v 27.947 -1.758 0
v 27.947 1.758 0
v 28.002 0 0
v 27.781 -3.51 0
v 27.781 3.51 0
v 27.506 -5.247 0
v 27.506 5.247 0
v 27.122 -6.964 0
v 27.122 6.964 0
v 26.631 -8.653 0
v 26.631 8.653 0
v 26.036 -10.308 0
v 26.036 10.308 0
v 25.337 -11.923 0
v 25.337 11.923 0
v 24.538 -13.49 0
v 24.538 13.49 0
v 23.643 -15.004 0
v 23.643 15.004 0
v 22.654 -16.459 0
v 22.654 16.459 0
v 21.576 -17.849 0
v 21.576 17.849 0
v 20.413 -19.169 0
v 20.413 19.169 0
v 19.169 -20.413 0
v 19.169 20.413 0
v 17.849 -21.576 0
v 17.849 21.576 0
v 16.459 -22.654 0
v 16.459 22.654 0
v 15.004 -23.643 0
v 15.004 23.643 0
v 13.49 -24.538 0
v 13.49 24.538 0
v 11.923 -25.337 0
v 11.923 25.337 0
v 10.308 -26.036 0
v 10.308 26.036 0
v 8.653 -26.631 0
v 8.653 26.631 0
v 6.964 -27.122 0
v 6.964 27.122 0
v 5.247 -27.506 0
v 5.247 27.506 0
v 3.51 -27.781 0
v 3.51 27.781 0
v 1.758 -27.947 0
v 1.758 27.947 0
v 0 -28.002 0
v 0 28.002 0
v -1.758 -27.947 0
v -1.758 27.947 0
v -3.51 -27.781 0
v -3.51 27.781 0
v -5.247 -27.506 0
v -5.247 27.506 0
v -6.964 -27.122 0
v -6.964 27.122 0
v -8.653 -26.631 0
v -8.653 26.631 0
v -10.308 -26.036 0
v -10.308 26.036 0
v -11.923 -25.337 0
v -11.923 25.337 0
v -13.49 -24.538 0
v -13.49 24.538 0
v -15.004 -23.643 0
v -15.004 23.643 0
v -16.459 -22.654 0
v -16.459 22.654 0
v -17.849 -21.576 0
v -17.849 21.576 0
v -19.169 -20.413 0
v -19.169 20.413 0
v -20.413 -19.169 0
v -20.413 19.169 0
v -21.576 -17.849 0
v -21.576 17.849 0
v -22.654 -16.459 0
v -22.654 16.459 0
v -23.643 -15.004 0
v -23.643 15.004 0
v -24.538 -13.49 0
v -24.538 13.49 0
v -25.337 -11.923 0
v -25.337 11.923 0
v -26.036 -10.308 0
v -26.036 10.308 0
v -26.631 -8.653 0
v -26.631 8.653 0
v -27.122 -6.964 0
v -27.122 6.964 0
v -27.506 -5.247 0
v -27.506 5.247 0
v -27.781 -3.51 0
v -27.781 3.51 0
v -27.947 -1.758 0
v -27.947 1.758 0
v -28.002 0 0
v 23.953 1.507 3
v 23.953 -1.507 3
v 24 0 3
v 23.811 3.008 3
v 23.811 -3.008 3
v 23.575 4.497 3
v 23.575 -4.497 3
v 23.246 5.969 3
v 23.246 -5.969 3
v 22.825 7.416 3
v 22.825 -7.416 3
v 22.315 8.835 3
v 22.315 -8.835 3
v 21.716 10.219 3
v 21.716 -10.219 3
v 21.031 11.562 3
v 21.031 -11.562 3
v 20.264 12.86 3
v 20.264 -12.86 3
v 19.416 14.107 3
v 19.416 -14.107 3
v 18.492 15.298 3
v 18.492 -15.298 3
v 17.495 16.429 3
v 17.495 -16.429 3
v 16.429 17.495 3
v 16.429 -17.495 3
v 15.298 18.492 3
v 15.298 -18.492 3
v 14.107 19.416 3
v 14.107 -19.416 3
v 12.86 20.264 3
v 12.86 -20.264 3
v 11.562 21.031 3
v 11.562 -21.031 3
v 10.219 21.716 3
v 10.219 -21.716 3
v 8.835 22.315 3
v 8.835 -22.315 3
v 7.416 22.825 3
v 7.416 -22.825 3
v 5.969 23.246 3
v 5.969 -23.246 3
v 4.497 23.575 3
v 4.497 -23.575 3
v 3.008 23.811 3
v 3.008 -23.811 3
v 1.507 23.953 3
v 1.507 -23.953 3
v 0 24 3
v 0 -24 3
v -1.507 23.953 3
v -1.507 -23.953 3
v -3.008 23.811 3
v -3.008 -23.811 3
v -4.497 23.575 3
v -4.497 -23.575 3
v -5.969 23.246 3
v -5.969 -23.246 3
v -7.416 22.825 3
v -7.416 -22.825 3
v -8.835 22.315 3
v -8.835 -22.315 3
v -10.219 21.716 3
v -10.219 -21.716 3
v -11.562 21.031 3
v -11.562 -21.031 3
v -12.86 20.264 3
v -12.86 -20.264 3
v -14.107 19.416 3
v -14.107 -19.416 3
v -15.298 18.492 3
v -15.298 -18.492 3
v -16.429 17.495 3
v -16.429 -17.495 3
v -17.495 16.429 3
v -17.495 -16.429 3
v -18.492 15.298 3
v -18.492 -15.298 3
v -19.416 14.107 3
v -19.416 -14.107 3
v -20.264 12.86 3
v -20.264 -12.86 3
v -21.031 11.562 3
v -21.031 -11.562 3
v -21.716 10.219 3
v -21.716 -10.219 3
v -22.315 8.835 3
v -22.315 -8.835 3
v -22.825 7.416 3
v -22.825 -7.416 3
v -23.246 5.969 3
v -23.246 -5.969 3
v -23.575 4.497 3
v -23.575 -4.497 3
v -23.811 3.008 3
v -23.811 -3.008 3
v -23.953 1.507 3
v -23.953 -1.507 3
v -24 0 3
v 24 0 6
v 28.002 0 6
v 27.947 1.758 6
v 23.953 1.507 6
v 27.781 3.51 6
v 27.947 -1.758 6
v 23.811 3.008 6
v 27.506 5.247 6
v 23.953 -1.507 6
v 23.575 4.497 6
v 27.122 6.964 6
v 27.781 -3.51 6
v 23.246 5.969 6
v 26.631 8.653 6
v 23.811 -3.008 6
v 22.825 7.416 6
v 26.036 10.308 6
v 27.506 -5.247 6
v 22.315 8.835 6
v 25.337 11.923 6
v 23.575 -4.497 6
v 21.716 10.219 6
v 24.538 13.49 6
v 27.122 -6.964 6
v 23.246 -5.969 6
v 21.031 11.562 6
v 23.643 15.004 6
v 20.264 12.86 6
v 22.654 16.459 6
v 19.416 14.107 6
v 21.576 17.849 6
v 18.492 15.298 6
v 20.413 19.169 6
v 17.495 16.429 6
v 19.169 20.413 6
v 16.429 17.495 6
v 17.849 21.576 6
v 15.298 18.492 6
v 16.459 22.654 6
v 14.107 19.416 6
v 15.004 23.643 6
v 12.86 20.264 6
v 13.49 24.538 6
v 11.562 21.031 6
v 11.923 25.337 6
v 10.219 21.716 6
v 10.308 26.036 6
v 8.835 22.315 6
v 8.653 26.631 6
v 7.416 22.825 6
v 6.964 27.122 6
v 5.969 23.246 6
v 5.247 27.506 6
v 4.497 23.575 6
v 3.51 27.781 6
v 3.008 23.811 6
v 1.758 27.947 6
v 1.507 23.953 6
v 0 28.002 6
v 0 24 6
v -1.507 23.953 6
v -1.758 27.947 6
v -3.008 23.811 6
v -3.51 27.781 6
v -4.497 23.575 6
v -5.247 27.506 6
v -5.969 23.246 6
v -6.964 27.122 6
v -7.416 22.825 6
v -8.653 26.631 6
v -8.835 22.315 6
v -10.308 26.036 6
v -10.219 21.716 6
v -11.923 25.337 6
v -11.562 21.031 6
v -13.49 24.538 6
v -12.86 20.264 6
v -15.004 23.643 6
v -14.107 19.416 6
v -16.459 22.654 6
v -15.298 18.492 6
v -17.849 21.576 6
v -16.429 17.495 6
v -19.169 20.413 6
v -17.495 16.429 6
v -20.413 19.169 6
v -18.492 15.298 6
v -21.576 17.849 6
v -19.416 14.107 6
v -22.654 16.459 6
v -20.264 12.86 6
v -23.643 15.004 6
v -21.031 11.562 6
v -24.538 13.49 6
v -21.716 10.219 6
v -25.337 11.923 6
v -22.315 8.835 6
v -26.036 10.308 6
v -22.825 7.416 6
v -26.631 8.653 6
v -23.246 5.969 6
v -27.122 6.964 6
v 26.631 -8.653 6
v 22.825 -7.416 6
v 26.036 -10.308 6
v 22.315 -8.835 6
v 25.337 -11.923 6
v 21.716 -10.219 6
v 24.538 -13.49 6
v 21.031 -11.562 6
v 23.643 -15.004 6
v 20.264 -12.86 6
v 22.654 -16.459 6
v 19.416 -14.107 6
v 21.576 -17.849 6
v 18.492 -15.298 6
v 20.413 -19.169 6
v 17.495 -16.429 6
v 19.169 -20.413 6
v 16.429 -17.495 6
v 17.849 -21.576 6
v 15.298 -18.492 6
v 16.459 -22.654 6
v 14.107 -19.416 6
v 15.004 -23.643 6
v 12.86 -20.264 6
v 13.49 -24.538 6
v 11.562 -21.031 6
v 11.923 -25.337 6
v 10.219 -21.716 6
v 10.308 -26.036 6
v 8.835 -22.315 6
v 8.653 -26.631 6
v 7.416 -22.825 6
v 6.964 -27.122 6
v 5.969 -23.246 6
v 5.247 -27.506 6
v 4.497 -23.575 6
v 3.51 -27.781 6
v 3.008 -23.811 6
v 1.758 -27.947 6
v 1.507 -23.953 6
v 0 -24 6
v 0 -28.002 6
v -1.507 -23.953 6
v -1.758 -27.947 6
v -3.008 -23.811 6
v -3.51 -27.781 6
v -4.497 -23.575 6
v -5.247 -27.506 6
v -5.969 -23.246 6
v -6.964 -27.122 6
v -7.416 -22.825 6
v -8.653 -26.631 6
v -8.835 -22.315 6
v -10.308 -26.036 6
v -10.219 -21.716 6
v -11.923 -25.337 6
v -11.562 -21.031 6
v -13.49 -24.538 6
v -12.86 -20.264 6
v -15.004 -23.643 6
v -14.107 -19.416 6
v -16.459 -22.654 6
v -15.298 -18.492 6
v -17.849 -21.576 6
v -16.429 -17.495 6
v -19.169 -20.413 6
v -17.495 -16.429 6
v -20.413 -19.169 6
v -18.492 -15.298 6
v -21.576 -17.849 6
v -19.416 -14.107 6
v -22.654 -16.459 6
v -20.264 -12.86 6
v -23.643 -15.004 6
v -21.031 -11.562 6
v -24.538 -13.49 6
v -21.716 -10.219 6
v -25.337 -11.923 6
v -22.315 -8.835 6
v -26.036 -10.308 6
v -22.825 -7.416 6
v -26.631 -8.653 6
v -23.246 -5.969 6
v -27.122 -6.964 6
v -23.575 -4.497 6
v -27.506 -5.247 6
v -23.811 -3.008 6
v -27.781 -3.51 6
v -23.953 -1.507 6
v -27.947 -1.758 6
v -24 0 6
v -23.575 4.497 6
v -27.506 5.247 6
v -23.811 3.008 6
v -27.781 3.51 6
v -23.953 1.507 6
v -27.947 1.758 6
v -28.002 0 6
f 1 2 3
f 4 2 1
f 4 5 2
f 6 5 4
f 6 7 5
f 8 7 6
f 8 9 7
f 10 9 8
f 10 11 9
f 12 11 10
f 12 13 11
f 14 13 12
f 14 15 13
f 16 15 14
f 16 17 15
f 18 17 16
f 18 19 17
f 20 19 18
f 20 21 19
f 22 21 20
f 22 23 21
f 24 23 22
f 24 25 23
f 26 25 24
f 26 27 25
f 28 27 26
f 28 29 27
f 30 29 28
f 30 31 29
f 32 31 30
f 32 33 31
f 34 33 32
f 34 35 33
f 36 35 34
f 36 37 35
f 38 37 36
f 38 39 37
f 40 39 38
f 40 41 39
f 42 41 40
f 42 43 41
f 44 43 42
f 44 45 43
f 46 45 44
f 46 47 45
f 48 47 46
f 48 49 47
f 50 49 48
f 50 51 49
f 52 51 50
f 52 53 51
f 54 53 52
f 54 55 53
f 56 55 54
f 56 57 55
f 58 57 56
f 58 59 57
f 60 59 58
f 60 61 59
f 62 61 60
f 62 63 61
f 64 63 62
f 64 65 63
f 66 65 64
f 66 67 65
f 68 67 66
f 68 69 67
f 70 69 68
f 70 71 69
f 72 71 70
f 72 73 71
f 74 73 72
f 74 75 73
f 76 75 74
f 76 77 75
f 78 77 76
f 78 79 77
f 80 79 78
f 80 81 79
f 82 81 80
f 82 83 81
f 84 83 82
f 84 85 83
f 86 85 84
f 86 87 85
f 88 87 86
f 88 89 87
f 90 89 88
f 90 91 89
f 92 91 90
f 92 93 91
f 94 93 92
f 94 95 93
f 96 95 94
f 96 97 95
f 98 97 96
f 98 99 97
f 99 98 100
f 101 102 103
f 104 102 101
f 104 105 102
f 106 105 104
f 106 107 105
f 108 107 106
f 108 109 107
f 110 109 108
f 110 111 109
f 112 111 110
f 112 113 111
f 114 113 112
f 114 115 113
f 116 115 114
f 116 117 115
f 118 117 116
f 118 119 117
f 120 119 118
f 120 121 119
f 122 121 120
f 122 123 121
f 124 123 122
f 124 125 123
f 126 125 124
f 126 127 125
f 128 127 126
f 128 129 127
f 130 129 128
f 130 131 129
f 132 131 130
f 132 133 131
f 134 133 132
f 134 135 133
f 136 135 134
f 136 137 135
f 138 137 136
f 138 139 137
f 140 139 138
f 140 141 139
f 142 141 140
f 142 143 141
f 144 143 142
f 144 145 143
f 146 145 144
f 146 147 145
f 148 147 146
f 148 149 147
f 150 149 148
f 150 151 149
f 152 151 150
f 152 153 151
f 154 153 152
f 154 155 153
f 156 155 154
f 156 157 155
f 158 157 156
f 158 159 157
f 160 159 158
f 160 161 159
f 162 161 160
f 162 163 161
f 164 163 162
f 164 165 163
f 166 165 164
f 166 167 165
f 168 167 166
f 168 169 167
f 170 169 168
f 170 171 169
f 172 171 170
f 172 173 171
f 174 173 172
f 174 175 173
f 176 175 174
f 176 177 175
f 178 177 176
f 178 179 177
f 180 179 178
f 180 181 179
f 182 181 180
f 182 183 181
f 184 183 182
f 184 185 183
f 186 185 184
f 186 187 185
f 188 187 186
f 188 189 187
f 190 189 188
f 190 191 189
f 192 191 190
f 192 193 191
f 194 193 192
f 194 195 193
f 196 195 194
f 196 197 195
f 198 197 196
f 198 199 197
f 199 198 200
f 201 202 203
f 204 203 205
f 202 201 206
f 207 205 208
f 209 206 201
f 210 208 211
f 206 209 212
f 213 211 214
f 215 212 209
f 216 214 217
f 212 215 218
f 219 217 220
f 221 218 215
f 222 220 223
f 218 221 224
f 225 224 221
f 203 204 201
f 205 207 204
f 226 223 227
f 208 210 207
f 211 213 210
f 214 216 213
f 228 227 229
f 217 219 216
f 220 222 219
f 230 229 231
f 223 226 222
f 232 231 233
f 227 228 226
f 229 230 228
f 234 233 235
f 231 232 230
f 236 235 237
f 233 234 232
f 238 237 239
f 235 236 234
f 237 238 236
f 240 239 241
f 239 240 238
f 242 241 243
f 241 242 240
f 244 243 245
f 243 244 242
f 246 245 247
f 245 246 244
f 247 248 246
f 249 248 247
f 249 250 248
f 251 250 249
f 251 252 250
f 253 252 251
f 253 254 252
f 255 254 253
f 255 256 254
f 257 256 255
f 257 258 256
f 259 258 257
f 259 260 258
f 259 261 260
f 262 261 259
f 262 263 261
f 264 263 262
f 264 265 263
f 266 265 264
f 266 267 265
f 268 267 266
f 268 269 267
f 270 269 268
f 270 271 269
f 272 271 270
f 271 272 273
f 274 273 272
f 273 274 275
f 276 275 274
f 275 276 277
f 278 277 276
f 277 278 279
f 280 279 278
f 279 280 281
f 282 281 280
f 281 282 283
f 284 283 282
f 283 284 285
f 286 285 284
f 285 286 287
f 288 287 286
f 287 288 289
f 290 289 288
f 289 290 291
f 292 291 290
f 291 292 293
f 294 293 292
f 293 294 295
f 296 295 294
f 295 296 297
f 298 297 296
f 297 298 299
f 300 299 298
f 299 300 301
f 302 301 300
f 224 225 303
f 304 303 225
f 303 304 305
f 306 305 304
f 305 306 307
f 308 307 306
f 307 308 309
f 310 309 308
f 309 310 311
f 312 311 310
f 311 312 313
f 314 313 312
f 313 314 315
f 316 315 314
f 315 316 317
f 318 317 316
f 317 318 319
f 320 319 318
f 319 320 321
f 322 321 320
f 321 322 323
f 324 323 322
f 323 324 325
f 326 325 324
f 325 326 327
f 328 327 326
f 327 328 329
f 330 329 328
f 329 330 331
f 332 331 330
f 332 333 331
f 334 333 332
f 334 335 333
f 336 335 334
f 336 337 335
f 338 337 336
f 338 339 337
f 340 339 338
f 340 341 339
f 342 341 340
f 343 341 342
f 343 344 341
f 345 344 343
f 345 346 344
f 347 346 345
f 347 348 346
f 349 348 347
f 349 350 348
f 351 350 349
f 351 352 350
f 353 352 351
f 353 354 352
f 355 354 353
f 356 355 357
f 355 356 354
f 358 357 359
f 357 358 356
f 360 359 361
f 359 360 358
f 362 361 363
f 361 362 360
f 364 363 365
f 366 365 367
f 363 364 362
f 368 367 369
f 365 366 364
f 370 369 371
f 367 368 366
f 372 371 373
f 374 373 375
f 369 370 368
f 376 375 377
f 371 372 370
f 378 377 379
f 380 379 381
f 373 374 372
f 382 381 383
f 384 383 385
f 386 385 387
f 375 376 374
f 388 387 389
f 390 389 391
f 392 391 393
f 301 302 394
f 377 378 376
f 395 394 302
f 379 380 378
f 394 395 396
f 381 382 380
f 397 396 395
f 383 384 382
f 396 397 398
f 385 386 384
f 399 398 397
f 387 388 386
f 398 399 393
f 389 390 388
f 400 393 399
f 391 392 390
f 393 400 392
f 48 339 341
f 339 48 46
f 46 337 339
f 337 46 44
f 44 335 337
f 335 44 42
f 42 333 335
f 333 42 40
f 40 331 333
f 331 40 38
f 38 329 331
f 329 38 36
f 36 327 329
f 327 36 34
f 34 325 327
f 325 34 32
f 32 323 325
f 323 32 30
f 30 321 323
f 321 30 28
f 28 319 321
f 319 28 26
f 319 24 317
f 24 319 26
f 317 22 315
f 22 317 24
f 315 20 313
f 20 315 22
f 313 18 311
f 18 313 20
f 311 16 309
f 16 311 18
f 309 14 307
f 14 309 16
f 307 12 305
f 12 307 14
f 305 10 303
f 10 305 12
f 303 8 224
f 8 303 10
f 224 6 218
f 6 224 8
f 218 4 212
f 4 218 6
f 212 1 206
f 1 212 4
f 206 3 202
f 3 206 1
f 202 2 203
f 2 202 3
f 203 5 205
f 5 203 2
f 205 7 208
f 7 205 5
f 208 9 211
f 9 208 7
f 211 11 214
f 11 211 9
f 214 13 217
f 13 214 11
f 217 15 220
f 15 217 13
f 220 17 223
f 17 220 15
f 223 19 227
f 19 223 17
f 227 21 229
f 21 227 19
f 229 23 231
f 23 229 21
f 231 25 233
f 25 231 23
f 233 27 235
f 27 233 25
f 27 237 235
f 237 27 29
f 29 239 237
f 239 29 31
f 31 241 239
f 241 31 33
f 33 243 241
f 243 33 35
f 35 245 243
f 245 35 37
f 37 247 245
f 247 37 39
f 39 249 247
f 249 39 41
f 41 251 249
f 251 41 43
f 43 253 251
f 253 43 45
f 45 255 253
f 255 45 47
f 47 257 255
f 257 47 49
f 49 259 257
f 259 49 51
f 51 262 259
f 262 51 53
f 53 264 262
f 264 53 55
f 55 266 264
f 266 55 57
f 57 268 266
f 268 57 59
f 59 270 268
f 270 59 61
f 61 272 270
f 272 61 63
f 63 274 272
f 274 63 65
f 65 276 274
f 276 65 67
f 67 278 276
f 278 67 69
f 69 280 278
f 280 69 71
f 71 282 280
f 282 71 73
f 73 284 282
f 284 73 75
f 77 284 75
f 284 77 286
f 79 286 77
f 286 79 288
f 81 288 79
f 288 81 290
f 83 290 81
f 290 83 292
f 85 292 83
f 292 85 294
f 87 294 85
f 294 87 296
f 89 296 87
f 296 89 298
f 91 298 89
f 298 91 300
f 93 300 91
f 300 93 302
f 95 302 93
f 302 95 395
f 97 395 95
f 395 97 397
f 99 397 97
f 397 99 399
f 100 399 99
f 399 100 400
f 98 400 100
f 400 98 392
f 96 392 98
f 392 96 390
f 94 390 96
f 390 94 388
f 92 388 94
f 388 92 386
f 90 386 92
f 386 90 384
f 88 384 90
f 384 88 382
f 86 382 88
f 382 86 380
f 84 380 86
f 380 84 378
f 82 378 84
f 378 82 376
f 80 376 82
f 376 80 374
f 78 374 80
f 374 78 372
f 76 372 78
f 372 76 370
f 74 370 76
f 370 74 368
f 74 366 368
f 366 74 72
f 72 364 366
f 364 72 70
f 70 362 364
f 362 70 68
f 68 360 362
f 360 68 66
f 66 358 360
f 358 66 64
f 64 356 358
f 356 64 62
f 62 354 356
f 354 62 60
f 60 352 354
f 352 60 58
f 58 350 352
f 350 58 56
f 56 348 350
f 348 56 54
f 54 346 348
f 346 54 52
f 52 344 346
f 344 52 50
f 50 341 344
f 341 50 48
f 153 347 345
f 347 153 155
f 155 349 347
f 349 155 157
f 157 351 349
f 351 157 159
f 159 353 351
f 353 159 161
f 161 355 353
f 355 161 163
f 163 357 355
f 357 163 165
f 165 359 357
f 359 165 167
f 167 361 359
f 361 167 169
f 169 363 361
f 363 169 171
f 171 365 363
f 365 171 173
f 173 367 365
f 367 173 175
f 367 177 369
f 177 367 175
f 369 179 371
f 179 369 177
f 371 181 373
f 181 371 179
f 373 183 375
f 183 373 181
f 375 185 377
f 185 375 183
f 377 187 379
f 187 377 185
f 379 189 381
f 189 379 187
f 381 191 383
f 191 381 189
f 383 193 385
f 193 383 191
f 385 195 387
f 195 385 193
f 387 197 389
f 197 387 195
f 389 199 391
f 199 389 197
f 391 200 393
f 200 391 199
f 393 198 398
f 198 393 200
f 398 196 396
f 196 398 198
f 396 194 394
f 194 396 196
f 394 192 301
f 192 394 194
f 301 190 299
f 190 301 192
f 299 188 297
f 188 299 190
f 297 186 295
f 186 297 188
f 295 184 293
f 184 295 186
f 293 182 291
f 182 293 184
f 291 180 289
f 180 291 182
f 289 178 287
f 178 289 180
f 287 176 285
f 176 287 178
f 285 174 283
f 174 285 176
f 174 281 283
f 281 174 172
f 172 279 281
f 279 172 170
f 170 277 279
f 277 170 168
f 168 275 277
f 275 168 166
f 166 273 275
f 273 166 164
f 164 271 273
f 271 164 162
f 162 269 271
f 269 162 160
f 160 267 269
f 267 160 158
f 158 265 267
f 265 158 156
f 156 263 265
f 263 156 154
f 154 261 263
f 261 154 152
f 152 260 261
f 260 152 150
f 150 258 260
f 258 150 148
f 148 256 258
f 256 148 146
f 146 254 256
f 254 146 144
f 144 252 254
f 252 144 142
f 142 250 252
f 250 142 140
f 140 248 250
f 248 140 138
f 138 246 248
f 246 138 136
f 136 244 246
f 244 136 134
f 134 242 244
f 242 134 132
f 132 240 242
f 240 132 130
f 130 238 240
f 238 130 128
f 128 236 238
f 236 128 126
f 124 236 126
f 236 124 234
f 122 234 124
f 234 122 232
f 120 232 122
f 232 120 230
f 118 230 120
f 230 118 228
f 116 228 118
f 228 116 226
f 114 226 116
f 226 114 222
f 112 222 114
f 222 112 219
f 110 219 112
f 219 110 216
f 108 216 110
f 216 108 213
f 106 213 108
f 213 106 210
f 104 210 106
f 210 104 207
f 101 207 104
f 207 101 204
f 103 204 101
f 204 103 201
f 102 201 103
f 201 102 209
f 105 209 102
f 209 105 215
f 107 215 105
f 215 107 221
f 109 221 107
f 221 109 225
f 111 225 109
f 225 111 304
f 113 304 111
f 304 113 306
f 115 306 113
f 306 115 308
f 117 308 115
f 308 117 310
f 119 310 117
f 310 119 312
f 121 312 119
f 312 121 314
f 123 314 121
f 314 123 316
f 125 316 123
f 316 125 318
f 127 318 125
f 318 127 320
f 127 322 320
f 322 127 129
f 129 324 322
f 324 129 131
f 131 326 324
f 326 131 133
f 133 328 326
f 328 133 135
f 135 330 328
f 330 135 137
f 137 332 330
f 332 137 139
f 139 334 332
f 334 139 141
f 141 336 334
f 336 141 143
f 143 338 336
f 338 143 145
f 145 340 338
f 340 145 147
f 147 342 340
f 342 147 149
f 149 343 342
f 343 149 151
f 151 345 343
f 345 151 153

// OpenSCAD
$fn = 100;
diameter = 47;
buffer = 1;
outer = 4;
thickness = 3;
wall_height = thickness * 2;

// The full circle
union()
{
    translate([ 0, 0, thickness / 2 ])
    {
        cylinder(h = thickness, d = diameter + buffer + outer, center = true);
    };
    linear_extrude(height = wall_height)
    {
        difference()
        {
            offset(delta = outer)
            {
                circle(d = diameter + buffer);
            };
            circle(d = diameter + buffer);
        }
    }
}
